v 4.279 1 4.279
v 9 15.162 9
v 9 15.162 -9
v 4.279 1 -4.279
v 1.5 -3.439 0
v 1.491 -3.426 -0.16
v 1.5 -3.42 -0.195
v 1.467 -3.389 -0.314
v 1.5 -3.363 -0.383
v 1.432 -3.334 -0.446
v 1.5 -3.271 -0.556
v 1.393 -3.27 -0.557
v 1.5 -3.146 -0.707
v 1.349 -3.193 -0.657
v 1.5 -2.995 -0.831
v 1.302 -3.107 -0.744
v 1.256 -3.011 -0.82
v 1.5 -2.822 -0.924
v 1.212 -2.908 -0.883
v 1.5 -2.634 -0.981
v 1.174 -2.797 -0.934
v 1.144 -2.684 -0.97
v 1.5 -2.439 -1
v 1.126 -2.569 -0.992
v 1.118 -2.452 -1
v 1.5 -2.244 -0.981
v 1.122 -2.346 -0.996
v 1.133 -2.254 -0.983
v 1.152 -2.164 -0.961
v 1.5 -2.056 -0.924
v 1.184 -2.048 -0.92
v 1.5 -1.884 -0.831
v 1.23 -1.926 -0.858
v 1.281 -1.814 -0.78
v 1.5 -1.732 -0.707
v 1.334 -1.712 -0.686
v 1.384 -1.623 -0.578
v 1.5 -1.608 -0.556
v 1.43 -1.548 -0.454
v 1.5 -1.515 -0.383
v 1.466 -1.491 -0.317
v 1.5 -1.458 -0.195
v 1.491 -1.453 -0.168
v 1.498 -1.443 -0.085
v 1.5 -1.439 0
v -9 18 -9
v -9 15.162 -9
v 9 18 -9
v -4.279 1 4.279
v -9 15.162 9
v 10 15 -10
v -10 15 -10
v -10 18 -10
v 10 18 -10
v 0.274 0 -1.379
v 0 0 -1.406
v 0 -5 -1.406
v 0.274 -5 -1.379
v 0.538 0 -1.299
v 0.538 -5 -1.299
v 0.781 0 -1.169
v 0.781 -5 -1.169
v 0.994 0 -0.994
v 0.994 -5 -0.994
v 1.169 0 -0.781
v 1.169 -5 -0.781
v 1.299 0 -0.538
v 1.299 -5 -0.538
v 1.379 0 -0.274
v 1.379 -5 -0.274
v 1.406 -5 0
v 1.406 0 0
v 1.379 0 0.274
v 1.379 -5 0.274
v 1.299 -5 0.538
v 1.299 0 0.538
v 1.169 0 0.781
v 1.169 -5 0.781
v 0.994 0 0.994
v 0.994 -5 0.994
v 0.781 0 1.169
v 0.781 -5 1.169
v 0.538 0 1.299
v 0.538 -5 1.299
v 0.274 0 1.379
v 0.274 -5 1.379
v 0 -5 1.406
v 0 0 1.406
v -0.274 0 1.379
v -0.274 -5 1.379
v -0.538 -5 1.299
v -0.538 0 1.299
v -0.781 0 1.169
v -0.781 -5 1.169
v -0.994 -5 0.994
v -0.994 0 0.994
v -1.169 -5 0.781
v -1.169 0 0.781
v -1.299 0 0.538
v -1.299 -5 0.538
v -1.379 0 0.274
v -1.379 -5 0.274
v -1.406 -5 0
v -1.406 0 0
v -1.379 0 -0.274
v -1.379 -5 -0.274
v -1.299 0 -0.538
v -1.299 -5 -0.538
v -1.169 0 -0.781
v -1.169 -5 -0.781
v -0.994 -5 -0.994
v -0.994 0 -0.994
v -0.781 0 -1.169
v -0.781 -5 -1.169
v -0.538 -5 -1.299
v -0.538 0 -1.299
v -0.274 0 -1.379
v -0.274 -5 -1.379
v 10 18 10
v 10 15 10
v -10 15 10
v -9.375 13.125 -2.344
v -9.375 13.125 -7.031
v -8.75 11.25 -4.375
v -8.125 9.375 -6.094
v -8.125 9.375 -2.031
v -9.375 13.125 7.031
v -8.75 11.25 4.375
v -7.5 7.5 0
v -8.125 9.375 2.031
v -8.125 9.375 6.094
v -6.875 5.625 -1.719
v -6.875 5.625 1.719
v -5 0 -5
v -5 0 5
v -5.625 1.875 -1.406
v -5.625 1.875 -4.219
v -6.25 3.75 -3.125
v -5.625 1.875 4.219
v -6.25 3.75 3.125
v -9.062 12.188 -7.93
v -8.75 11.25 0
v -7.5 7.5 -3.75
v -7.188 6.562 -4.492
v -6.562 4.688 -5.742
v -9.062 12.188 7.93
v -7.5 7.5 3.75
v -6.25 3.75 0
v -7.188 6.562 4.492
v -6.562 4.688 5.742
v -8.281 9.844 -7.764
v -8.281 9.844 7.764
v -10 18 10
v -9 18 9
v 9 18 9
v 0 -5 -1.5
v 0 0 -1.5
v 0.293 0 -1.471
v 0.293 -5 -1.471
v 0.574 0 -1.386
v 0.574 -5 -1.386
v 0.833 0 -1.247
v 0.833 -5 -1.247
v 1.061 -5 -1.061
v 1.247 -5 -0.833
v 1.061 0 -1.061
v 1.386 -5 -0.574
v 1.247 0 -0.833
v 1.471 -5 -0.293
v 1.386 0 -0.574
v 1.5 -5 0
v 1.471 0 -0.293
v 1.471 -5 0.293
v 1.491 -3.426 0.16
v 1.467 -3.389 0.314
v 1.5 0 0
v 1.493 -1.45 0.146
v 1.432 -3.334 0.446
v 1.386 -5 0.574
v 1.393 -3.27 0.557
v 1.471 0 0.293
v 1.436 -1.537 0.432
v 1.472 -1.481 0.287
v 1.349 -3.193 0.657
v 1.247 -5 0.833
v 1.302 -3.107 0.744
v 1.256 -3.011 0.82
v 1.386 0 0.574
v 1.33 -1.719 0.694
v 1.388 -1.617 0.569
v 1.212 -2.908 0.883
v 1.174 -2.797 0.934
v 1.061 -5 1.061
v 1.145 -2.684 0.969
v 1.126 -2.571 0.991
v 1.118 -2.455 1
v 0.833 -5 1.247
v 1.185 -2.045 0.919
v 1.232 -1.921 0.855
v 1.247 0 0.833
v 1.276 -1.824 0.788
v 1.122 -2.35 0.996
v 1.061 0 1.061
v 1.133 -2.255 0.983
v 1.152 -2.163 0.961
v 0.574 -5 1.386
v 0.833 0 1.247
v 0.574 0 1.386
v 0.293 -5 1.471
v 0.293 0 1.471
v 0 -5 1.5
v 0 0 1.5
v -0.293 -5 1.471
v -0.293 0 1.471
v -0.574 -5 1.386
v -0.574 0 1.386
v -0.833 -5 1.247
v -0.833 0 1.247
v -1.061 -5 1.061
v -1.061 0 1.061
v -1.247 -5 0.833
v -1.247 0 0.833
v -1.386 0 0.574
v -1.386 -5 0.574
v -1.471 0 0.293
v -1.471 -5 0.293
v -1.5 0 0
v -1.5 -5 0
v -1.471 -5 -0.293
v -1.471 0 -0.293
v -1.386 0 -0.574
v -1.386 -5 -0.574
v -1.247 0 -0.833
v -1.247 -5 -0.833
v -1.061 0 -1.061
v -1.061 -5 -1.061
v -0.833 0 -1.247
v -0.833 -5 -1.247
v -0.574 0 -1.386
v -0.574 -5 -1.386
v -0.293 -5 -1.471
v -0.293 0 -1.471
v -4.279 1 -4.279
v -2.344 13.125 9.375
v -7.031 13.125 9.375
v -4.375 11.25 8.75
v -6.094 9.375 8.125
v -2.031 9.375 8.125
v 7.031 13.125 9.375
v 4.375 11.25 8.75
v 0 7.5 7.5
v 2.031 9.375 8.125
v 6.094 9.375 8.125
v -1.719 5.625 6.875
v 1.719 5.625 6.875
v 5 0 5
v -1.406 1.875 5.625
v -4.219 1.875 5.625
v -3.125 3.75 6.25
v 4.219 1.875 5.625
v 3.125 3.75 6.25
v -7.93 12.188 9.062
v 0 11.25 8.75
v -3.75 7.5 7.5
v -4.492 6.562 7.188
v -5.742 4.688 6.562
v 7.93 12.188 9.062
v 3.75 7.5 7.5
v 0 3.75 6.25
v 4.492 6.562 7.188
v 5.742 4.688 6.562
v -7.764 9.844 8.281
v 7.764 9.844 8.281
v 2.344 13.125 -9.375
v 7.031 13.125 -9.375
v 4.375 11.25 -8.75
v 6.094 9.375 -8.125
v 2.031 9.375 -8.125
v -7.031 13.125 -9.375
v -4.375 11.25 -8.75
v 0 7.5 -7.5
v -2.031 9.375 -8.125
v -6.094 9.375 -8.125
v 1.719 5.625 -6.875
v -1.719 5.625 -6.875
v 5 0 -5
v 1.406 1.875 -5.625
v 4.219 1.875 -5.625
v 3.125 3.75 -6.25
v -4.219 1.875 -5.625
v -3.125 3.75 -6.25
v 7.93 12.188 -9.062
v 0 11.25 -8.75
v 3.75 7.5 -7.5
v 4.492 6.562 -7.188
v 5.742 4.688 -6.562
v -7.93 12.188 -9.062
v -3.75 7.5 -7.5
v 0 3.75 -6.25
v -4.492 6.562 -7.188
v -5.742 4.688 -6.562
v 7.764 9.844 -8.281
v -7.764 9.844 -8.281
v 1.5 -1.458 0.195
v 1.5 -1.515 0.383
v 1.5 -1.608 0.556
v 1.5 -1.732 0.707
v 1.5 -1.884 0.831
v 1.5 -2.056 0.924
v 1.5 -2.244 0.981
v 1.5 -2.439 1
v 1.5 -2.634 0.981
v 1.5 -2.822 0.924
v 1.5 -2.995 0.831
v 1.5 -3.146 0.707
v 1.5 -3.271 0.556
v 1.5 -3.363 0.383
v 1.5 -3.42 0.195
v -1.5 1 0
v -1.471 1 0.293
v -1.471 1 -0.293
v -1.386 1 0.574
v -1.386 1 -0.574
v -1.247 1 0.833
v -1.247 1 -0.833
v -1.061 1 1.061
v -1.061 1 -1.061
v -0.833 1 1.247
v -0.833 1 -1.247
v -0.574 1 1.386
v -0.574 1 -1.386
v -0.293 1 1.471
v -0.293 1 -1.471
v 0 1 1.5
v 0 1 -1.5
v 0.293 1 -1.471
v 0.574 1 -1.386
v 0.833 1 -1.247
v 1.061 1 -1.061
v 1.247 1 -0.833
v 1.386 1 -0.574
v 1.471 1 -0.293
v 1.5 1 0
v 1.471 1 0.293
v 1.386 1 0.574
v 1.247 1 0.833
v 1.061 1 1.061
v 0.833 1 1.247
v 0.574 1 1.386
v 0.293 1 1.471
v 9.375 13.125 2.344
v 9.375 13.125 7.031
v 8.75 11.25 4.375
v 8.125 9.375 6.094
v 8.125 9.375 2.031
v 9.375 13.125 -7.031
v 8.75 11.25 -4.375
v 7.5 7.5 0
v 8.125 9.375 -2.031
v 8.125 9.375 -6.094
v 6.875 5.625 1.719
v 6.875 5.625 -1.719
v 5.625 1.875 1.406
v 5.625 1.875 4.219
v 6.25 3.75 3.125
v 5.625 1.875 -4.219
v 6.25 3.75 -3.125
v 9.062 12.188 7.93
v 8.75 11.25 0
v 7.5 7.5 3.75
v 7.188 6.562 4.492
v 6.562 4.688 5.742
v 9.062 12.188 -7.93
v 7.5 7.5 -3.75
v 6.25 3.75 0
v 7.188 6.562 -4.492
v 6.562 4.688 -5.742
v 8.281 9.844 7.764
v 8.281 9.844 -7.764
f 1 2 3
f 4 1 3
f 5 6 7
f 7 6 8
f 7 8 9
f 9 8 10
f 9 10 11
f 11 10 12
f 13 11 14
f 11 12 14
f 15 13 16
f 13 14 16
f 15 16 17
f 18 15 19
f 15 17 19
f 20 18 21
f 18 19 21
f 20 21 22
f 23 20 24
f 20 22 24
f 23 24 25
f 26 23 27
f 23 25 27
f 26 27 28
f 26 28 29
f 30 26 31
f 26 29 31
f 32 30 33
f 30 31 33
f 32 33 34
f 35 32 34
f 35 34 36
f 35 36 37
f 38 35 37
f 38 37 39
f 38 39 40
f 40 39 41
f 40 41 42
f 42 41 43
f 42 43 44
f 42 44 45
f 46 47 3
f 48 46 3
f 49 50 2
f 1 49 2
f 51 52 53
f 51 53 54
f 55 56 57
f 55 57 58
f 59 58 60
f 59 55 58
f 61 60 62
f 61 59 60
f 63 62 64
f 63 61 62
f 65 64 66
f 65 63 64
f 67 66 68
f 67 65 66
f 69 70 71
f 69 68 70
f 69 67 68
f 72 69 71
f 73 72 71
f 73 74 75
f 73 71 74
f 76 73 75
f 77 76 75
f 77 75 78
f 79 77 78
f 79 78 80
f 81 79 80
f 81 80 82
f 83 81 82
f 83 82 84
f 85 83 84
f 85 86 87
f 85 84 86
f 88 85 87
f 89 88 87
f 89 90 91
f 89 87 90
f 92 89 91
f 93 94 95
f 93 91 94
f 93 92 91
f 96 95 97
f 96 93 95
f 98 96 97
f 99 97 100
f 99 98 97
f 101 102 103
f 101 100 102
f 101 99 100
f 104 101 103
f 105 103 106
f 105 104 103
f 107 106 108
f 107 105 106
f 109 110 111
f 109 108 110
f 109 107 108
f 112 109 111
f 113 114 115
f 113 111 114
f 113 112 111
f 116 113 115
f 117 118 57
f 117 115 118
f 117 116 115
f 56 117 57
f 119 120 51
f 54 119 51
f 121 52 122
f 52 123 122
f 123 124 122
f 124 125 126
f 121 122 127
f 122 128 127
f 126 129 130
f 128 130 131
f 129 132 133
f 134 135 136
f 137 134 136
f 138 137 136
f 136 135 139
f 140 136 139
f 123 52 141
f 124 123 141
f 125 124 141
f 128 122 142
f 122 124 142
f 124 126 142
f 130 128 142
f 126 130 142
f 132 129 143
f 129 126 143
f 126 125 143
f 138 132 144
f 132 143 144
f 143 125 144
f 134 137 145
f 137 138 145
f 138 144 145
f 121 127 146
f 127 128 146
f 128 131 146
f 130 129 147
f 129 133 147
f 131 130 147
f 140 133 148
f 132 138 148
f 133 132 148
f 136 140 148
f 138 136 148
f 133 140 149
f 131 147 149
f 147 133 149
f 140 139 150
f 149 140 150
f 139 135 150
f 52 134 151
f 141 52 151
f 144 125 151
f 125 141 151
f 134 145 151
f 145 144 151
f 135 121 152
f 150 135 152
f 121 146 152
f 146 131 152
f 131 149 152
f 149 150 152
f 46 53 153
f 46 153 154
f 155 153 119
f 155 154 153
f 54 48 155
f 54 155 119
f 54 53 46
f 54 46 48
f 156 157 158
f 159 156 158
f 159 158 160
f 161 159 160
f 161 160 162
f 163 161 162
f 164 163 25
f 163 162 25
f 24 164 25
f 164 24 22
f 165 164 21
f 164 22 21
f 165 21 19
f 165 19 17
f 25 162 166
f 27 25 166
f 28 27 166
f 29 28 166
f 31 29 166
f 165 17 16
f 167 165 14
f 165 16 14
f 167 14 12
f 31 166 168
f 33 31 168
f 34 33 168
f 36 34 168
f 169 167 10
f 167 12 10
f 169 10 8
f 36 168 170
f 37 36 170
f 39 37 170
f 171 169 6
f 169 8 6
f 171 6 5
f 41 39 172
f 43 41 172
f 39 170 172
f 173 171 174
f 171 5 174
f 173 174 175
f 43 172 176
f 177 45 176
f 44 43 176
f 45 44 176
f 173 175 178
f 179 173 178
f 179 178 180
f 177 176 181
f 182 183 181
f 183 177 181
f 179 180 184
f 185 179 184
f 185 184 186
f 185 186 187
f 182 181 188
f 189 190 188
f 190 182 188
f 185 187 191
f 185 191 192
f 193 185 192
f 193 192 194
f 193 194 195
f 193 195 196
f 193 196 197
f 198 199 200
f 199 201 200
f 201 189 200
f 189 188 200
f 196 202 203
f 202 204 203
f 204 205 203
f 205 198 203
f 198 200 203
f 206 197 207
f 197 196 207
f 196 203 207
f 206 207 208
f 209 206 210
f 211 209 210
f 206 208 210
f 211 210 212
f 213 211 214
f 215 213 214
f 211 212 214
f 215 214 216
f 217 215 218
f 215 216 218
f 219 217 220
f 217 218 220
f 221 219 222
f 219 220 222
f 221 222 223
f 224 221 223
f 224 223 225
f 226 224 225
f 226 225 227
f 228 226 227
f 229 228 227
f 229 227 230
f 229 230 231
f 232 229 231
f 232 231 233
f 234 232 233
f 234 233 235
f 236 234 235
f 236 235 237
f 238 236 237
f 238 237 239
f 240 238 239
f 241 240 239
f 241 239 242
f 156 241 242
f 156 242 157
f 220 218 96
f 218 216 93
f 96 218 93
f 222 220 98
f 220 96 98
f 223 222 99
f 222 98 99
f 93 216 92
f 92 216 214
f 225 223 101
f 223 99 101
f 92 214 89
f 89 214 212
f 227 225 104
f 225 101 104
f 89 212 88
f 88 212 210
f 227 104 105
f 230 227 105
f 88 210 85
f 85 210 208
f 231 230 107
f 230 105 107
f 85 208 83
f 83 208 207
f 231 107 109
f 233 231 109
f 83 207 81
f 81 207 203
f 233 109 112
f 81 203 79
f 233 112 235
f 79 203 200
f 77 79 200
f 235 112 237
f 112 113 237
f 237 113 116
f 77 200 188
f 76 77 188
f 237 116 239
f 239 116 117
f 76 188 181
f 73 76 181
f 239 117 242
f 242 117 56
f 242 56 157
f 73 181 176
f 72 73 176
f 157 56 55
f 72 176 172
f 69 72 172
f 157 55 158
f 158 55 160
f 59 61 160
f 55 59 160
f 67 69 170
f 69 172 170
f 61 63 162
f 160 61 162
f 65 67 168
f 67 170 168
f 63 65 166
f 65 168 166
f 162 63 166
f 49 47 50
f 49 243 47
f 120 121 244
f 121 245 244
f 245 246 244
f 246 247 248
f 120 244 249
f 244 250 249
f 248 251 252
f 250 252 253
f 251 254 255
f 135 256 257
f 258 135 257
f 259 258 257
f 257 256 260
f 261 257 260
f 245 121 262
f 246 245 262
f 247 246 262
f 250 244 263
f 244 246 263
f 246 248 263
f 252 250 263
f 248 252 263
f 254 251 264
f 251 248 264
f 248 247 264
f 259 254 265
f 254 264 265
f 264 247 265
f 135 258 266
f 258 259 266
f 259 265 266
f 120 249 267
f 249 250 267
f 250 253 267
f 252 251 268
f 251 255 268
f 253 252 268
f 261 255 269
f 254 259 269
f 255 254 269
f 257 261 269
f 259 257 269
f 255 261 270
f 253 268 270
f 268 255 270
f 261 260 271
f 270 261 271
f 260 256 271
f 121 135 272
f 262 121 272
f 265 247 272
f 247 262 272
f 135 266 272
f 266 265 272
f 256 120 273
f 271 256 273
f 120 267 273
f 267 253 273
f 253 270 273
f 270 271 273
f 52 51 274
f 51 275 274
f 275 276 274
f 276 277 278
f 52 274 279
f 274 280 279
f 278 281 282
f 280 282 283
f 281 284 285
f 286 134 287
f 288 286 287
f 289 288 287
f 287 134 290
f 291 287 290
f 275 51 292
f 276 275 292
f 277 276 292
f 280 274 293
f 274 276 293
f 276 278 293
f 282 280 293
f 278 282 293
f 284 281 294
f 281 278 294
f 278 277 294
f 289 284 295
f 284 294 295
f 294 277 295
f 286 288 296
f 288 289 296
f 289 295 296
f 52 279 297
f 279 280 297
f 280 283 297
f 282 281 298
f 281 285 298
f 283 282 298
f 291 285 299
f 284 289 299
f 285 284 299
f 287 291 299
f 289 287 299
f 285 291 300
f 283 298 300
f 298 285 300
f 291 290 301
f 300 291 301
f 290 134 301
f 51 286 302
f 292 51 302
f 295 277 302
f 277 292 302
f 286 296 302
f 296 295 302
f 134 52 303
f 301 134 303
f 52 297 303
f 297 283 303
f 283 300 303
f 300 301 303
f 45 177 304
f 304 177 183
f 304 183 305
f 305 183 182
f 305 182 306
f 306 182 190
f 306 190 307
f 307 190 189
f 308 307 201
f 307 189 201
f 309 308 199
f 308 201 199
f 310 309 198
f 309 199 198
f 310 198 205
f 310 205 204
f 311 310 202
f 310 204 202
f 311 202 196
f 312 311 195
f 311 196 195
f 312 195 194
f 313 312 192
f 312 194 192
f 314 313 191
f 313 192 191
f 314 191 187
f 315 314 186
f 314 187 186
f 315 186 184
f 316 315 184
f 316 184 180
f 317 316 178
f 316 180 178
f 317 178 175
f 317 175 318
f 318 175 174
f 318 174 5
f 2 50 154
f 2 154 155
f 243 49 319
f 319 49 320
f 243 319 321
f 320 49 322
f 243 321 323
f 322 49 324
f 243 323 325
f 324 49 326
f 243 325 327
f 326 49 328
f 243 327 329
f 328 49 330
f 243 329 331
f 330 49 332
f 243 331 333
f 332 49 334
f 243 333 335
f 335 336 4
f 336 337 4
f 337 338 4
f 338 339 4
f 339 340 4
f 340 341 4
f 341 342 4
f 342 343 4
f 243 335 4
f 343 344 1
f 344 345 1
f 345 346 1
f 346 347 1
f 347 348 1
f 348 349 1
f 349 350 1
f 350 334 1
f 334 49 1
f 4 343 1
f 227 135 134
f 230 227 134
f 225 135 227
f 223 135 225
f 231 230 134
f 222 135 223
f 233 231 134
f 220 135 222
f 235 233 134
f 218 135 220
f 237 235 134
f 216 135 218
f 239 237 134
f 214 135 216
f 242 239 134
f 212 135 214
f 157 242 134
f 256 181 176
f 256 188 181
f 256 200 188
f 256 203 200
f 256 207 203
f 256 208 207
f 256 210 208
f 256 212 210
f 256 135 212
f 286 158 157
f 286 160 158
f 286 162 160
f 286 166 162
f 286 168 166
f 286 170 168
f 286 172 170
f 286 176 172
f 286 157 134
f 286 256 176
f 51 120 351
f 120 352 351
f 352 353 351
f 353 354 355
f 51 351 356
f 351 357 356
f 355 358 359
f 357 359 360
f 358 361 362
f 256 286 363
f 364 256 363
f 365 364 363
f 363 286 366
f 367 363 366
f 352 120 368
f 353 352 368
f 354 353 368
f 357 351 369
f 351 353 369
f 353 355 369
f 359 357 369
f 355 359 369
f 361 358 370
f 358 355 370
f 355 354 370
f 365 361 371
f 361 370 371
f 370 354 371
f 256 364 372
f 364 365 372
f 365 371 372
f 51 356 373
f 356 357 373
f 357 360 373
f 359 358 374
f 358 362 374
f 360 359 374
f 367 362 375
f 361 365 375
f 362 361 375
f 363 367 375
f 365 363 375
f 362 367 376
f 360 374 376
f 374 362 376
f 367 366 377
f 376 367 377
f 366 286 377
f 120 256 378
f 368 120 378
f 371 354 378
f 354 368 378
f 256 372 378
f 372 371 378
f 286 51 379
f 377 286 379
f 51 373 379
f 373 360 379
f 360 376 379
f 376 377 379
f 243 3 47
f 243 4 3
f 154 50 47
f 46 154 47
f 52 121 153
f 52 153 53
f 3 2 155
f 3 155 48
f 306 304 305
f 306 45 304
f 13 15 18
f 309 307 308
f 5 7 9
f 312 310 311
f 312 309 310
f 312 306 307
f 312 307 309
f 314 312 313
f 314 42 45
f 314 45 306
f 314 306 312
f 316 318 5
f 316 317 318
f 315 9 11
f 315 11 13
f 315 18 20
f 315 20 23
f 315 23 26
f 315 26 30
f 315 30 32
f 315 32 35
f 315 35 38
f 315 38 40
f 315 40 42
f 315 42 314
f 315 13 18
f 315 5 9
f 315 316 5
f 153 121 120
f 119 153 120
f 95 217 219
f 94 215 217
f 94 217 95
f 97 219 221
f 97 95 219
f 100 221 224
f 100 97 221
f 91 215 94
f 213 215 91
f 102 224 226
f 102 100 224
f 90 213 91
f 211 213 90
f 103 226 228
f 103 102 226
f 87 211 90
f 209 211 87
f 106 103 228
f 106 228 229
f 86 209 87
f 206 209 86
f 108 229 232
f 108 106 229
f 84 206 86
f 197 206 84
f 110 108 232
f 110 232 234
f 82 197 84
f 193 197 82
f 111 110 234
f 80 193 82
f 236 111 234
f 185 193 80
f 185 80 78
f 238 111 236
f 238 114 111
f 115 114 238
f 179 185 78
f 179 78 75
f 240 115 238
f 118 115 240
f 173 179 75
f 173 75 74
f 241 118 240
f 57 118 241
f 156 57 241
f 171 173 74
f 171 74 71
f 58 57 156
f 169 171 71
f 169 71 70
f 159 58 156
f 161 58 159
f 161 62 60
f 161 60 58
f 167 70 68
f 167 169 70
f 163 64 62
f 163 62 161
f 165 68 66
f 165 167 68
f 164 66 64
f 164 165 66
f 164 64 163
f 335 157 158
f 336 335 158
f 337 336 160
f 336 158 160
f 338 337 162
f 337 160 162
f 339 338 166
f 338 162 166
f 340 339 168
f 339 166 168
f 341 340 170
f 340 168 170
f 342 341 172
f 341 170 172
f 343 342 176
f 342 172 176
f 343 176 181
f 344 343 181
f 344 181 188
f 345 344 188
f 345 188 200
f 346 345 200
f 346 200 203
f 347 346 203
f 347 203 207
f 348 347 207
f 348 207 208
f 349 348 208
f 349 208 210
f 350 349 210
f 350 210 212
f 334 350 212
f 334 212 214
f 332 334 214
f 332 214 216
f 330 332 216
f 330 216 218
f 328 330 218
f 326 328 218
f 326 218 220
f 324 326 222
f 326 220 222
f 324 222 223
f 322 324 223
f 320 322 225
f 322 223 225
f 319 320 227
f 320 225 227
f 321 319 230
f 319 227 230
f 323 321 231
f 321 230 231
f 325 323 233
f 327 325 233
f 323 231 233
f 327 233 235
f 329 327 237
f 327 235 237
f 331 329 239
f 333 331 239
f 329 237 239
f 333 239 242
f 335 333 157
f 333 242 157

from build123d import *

# Parameters (mm, degrees)
CROQUIS3_W                 = 20
CROQUIS3_H                 = 20
SALIENTE_EXTRUIR1_DEPTH    = 3
VACIADO2_T                 = -1
CROQUIS4_R                 = 1.5
CORTAR_EXTRUIR1_DEPTH      = 3
CROQUIS5_R                 = 1.5
SALIENTE_EXTRUIR2_DEPTH    = 5
CROQUIS6_R                 = 1.355898714
CORTAR_EXTRUIR2_DEPTH      = 15
CROQUIS7_R                 = 1
SALIENTE_EXTRUIR4_DEPTH    = 1.5
CORTAR_EXTRUIR3_DEPTH      = 31.5
CORTAR_EXTRUIR3_DEPTH_BACK = 1.5
CROQUIS10_R                = 1.406391719


with BuildPart() as part:
    # Croquis2 → Recubrir1 section 0
    with BuildSketch(Plane(origin=(0, 15, 0), x_dir=(1, 0, 0), z_dir=(0, 1, 0))):
        with BuildLine():
            Line((-10, -10), (10, -10))
            Line((10, -10), (10, 10))
            Line((10, 10), (-10, 10))
            Line((-10, 10), (-10, -10))
        make_face()
    # Croquis1 → Recubrir1 section 1
    with BuildSketch(Plane(origin=(0, 0, 0), x_dir=(1, 0, 0), z_dir=(0, 1, 0))):
        with BuildLine():
            Line((-5, -5), (5, -5))
            Line((5, -5), (5, 5))
            Line((5, 5), (-5, 5))
            Line((-5, 5), (-5, -5))
        make_face()
    loft()

    # Croquis3 → Saliente-Extruir1 (add)
    with BuildSketch(Plane(origin=(0, 15, 0), x_dir=(1, 0, 0), z_dir=(0, 1, 0))):
        Rectangle(CROQUIS3_W, CROQUIS3_H)
    extrude(amount=SALIENTE_EXTRUIR1_DEPTH)

    # Vaciado2
    vaciado2_openings = [part.faces().sort_by_distance(p)[0] for p in [
        (0, 18, 0),
    ]]
    offset(amount=VACIADO2_T, openings=vaciado2_openings, kind=Kind.INTERSECTION)

    # Croquis4 → Cortar-Extruir1 (cut)
    with BuildSketch(Plane(origin=(0, 0, 0), x_dir=(-1, 0, 0), z_dir=(0, -1, 0))):
        with Locations(Location((0, 0, 0), (0, 0, 90))):
            Circle(CROQUIS4_R)
    extrude(amount=-CORTAR_EXTRUIR1_DEPTH, mode=Mode.SUBTRACT)


with BuildPart() as body_2:
    # Croquis5 → Saliente-Extruir2 (new body)
    with BuildSketch(Plane(origin=(0, 0, 0), x_dir=(-1, 0, 0), z_dir=(0, -1, 0))):
        with Locations(Location((0, 0, 0), (0, 0, 90))):
            Circle(CROQUIS5_R)
    extrude(amount=SALIENTE_EXTRUIR2_DEPTH)

    # Croquis6 → Cortar-Extruir2 (cut)
    with BuildSketch(Plane(origin=(0, -5, 0), x_dir=(-1, 0, 0), z_dir=(0, -1, 0))):
        with Locations(Location((0, 0, 0), (0, 0, 90))):
            Circle(CROQUIS6_R)
    extrude(amount=-CORTAR_EXTRUIR2_DEPTH, mode=Mode.SUBTRACT)

    # Croquis7 → Saliente-Extruir4 (add)
    with BuildSketch(Plane(origin=(0, 0, 0), x_dir=(0, 0, -1), z_dir=(1, 0, 0))):
        with Locations(Location((0, -2.4391778, 0), (0, 0, 180))):
            Circle(CROQUIS7_R)
    extrude(amount=SALIENTE_EXTRUIR4_DEPTH)

    # Croquis10 → Cortar-Extruir3 (cut, two sides: drawn at the far end of the back side and taken through both)
    with BuildSketch(Plane(origin=(0, 0, 0), x_dir=(-1, 0, 0), z_dir=(0, -1, 0)).offset(-CORTAR_EXTRUIR3_DEPTH_BACK)):
        with Locations(Location((0, 0, 0), (0, 0, 90))):
            Circle(CROQUIS10_R)
    extrude(amount=CORTAR_EXTRUIR3_DEPTH + CORTAR_EXTRUIR3_DEPTH_BACK, mode=Mode.SUBTRACT)


solid = Compound([part.part, body_2.part])
